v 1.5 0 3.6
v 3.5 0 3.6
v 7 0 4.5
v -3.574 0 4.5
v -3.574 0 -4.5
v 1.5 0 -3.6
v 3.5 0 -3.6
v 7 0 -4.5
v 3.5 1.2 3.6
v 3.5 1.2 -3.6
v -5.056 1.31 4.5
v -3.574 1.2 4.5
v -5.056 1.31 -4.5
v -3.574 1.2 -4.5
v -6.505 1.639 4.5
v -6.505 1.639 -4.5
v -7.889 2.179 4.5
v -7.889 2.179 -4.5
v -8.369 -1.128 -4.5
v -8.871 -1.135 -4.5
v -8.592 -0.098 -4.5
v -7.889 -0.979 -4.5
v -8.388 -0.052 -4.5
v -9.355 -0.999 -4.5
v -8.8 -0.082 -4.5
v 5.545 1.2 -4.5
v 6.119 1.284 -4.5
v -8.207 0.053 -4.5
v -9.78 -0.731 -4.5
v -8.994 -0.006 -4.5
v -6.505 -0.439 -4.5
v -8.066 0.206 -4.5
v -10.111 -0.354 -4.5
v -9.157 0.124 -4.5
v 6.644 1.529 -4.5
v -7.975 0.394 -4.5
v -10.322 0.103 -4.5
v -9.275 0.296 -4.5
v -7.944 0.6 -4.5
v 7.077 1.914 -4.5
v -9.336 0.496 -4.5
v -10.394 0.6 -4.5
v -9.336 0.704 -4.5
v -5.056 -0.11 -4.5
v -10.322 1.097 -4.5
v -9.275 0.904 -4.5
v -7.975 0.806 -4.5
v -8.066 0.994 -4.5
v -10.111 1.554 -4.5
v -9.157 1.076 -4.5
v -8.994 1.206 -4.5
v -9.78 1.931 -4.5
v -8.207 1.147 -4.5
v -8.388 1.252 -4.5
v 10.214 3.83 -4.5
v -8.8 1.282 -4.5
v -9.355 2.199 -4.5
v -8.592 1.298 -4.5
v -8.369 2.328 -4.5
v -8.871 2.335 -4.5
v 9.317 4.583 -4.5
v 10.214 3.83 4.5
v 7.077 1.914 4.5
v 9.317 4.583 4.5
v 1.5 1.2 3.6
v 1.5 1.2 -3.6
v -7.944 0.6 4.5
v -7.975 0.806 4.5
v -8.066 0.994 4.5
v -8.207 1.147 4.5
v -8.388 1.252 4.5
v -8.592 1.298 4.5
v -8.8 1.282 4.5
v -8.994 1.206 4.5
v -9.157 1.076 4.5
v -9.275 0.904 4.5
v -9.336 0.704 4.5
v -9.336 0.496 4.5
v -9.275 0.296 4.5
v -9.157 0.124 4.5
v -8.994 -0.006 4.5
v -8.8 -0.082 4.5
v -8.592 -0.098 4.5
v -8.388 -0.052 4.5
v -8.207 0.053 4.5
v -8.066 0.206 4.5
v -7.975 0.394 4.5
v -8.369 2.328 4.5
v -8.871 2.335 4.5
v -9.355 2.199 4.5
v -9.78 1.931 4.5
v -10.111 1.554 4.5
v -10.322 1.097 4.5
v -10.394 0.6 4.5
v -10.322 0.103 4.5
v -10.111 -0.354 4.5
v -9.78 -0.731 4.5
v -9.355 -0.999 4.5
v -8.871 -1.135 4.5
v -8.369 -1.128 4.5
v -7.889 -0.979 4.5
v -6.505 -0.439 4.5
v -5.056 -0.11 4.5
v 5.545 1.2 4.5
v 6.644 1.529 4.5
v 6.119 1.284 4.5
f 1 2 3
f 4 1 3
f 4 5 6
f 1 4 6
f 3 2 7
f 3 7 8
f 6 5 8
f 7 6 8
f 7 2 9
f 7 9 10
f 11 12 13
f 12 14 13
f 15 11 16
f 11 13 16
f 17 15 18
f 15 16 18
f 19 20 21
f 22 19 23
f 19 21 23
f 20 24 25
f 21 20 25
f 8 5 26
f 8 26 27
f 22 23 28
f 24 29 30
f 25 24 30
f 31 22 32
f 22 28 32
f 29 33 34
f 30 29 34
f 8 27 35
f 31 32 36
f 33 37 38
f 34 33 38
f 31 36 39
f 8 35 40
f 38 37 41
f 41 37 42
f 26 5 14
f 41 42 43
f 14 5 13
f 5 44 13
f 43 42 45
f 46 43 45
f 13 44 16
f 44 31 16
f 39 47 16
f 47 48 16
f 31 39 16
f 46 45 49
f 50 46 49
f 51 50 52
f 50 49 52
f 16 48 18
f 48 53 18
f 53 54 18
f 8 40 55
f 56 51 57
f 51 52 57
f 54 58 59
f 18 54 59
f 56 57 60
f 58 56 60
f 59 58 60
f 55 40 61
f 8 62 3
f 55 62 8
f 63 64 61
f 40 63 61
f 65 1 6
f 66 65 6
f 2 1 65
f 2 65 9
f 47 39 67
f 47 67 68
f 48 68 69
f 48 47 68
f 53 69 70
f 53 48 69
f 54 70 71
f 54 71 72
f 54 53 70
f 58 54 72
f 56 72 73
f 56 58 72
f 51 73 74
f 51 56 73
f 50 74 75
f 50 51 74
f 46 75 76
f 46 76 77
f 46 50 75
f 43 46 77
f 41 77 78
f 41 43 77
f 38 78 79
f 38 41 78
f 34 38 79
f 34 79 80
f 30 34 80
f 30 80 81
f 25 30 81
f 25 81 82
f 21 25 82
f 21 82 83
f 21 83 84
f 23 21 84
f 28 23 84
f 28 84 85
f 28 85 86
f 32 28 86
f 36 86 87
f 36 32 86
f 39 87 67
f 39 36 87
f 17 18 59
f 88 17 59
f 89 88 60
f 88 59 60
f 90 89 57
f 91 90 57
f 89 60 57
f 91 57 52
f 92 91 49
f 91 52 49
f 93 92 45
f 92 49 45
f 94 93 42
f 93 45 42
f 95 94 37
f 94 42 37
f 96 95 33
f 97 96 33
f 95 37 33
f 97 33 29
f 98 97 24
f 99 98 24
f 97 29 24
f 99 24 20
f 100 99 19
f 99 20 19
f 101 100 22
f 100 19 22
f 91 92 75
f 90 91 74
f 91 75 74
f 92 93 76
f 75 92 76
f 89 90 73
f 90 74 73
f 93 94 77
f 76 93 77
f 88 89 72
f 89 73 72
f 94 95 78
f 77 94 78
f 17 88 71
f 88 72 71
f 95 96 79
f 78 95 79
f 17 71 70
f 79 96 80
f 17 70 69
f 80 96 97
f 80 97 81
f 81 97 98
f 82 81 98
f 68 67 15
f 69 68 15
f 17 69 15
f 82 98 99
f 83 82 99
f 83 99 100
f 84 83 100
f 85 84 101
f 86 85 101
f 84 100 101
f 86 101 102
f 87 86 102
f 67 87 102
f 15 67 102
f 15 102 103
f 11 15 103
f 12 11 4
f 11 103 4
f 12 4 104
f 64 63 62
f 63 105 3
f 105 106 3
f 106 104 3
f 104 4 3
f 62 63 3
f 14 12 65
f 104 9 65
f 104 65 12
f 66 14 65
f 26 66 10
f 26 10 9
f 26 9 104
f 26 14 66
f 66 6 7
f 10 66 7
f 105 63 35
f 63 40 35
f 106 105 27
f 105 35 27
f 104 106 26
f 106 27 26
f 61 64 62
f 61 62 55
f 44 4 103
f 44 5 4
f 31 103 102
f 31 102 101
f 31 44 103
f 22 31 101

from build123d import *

# Parameters (mm, degrees)
SKETCH1_W                = 14
SKETCH1_H                = 9
SKETCH1_W_2              = 2
SKETCH1_H_2              = 7.2
BOSS_EXTRUDE1_DEPTH      = 1.2
BOSS_EXTRUDE2_DEPTH      = 4.5
BOSS_EXTRUDE2_DEPTH_BACK = 4.5
SKETCH2_R                = 1.75
SKETCH2_R_2              = 0.7
FILLET1_R                = 10
BOSS_EXTRUDE3_DEPTH      = 0.771345
BOSS_EXTRUDE3_DEPTH_BACK = 0.4
SKETCH3_W                = 9
SKETCH3_H                = 5
FILLET2_R                = 2


with BuildPart() as part:
    # Sketch1 → Boss-Extrude1 (new body)
    with BuildSketch(Plane(origin=(0, 0, 0), x_dir=(1, 0, 0), z_dir=(0, 1, 0))):
        Rectangle(SKETCH1_W, SKETCH1_H)
        with Locations((2.5, 0)):
            Rectangle(SKETCH1_W_2, SKETCH1_H_2, mode=Mode.SUBTRACT)
    extrude(amount=BOSS_EXTRUDE1_DEPTH)

    # Sketch2 → Boss-Extrude2 (add, two sides: drawn at the far end of the back side and taken through both)
    with BuildSketch(Plane.XY.offset(-BOSS_EXTRUDE2_DEPTH_BACK)):
        with Locations((-8.643928222, 0.6)):
            Circle(SKETCH2_R)
        with Locations((-8.643928222, 0.6)):
            Circle(SKETCH2_R_2, mode=Mode.SUBTRACT)
    extrude(amount=BOSS_EXTRUDE2_DEPTH + BOSS_EXTRUDE2_DEPTH_BACK)

    # Fillet1
    fillet1_edges = [part.edges().sort_by_distance(p)[0] for p in [
        (-7, 1.2, 0),
        (-7, 0, 0),
    ]]
    fillet(fillet1_edges, radius=FILLET1_R)

    # Sketch3 → Boss-Extrude3 (add, two sides: drawn at the far end of the back side and taken through both)
    with BuildSketch(Plane(origin=(3.51688397, -2.951016042, 0), x_dir=(0, 0, -1), z_dir=(0.7660444431189749, -0.642787609686543, 0)).offset(-BOSS_EXTRUDE3_DEPTH_BACK)):
        with Locations((0, 6.999513268)):
            Rectangle(SKETCH3_W, SKETCH3_H)
    extrude(amount=BOSS_EXTRUDE3_DEPTH + BOSS_EXTRUDE3_DEPTH_BACK)

    # Fillet2
    fillet2_edges = [part.edges().sort_by_distance(p)[0] for p in [
        (6.477837084, 1.2, 0),
    ]]
    fillet(fillet2_edges, radius=FILLET2_R)


solid = part.part
